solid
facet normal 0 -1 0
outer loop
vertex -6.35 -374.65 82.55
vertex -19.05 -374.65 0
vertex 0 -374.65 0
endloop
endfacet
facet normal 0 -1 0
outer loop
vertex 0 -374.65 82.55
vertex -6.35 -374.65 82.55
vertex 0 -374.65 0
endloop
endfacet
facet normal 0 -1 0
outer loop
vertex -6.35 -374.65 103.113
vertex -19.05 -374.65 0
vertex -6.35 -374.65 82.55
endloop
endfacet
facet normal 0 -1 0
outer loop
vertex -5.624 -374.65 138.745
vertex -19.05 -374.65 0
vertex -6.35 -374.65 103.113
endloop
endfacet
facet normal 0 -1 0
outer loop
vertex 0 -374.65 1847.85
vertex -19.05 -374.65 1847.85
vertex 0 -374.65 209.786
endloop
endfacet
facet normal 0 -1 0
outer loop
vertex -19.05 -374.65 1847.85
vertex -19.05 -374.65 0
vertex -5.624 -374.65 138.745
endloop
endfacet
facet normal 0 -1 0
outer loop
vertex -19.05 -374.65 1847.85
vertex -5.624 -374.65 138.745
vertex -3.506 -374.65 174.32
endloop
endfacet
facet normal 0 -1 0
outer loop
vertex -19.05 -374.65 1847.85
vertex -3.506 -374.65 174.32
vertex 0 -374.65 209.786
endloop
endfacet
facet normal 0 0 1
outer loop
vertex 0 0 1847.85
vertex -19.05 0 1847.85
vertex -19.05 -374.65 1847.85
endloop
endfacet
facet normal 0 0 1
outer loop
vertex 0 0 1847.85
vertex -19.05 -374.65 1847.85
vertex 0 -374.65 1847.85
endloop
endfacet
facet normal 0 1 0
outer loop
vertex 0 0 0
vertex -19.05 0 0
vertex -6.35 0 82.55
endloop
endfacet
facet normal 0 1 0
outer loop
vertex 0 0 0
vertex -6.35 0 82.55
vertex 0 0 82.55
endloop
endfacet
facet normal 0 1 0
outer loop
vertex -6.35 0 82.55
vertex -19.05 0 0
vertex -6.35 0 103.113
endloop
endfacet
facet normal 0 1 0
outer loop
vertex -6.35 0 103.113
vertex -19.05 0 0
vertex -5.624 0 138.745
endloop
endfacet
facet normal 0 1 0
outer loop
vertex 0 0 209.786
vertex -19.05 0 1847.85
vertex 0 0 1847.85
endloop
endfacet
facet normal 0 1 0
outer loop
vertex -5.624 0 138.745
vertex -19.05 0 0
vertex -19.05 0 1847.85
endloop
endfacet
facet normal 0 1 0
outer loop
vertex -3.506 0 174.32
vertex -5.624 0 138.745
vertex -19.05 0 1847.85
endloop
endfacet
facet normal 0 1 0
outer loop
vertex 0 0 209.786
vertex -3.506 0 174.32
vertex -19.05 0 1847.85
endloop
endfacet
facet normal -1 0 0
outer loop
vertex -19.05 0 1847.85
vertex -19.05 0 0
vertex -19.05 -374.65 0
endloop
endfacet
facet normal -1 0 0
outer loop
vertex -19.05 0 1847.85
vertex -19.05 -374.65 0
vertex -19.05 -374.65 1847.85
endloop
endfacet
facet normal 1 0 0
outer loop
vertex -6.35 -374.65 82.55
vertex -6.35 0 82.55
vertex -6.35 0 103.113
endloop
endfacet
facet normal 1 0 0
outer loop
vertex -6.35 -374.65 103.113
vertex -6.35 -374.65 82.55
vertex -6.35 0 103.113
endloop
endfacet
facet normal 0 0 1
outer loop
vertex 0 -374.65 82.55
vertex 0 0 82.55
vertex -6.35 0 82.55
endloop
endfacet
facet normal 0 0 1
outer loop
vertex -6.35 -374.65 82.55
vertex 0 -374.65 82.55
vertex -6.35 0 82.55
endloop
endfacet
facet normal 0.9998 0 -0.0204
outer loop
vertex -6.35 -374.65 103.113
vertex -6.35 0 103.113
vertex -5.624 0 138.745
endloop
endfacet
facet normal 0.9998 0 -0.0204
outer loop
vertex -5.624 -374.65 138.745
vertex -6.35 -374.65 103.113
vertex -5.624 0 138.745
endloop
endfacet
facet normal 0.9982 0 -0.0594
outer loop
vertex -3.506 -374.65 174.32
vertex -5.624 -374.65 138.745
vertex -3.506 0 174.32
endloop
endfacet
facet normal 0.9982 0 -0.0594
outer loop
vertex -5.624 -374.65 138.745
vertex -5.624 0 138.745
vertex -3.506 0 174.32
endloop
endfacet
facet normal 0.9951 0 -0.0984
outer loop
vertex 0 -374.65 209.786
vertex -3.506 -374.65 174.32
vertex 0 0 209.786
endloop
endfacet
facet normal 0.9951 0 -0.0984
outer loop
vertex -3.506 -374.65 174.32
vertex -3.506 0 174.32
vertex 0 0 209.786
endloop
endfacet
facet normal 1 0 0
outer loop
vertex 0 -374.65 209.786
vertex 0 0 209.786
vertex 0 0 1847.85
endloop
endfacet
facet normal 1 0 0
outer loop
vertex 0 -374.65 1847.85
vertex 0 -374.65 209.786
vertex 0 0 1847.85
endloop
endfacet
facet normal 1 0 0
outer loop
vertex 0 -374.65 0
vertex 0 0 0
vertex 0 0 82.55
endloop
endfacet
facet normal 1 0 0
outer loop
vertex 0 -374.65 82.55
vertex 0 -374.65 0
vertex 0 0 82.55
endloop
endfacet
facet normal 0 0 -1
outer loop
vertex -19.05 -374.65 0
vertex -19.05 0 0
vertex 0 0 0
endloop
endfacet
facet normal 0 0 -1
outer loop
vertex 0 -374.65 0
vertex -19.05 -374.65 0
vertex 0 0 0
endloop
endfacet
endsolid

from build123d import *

# Parameters (mm, degrees)
F0_W     = 19.05
F0_H     = 1847.85
F1_DEPTH = 374.65
F3_DEPTH = 374.651


with BuildPart() as f1:
    # F0 (on Front) → F1 (new body)
    with BuildSketch(Plane.XZ):
        with Locations((-9.525, 923.925)):
            Rectangle(F0_W, F0_H)
    extrude(amount=F1_DEPTH)

    # F2 (on face) → F3 (cut, through all)
    with BuildSketch(Plane(origin=(0, 0, 0), x_dir=(-1, 0, 0), z_dir=(0, 1, 0))):
        with BuildLine():
            ThreePointArc((6.35, 103.1133947655), (4.7389469003, 156.5427900913), (0, 209.7859883352))
            Line((0, 209.7859883352), (0, 82.55))
            Line((0, 82.55), (6.35, 82.55))
            Line((6.35, 82.55), (6.35, 101.6))
            Line((6.35, 101.6), (6.35, 103.1133947655))
        make_face()
        Polygon((0, 82.55), (0, 209.7859883352), (-25.7673989981, 209.7859883352), (-37.0378904045, 82.55), align=None)
    extrude(amount=-F3_DEPTH, mode=Mode.SUBTRACT)


solid = f1.part
